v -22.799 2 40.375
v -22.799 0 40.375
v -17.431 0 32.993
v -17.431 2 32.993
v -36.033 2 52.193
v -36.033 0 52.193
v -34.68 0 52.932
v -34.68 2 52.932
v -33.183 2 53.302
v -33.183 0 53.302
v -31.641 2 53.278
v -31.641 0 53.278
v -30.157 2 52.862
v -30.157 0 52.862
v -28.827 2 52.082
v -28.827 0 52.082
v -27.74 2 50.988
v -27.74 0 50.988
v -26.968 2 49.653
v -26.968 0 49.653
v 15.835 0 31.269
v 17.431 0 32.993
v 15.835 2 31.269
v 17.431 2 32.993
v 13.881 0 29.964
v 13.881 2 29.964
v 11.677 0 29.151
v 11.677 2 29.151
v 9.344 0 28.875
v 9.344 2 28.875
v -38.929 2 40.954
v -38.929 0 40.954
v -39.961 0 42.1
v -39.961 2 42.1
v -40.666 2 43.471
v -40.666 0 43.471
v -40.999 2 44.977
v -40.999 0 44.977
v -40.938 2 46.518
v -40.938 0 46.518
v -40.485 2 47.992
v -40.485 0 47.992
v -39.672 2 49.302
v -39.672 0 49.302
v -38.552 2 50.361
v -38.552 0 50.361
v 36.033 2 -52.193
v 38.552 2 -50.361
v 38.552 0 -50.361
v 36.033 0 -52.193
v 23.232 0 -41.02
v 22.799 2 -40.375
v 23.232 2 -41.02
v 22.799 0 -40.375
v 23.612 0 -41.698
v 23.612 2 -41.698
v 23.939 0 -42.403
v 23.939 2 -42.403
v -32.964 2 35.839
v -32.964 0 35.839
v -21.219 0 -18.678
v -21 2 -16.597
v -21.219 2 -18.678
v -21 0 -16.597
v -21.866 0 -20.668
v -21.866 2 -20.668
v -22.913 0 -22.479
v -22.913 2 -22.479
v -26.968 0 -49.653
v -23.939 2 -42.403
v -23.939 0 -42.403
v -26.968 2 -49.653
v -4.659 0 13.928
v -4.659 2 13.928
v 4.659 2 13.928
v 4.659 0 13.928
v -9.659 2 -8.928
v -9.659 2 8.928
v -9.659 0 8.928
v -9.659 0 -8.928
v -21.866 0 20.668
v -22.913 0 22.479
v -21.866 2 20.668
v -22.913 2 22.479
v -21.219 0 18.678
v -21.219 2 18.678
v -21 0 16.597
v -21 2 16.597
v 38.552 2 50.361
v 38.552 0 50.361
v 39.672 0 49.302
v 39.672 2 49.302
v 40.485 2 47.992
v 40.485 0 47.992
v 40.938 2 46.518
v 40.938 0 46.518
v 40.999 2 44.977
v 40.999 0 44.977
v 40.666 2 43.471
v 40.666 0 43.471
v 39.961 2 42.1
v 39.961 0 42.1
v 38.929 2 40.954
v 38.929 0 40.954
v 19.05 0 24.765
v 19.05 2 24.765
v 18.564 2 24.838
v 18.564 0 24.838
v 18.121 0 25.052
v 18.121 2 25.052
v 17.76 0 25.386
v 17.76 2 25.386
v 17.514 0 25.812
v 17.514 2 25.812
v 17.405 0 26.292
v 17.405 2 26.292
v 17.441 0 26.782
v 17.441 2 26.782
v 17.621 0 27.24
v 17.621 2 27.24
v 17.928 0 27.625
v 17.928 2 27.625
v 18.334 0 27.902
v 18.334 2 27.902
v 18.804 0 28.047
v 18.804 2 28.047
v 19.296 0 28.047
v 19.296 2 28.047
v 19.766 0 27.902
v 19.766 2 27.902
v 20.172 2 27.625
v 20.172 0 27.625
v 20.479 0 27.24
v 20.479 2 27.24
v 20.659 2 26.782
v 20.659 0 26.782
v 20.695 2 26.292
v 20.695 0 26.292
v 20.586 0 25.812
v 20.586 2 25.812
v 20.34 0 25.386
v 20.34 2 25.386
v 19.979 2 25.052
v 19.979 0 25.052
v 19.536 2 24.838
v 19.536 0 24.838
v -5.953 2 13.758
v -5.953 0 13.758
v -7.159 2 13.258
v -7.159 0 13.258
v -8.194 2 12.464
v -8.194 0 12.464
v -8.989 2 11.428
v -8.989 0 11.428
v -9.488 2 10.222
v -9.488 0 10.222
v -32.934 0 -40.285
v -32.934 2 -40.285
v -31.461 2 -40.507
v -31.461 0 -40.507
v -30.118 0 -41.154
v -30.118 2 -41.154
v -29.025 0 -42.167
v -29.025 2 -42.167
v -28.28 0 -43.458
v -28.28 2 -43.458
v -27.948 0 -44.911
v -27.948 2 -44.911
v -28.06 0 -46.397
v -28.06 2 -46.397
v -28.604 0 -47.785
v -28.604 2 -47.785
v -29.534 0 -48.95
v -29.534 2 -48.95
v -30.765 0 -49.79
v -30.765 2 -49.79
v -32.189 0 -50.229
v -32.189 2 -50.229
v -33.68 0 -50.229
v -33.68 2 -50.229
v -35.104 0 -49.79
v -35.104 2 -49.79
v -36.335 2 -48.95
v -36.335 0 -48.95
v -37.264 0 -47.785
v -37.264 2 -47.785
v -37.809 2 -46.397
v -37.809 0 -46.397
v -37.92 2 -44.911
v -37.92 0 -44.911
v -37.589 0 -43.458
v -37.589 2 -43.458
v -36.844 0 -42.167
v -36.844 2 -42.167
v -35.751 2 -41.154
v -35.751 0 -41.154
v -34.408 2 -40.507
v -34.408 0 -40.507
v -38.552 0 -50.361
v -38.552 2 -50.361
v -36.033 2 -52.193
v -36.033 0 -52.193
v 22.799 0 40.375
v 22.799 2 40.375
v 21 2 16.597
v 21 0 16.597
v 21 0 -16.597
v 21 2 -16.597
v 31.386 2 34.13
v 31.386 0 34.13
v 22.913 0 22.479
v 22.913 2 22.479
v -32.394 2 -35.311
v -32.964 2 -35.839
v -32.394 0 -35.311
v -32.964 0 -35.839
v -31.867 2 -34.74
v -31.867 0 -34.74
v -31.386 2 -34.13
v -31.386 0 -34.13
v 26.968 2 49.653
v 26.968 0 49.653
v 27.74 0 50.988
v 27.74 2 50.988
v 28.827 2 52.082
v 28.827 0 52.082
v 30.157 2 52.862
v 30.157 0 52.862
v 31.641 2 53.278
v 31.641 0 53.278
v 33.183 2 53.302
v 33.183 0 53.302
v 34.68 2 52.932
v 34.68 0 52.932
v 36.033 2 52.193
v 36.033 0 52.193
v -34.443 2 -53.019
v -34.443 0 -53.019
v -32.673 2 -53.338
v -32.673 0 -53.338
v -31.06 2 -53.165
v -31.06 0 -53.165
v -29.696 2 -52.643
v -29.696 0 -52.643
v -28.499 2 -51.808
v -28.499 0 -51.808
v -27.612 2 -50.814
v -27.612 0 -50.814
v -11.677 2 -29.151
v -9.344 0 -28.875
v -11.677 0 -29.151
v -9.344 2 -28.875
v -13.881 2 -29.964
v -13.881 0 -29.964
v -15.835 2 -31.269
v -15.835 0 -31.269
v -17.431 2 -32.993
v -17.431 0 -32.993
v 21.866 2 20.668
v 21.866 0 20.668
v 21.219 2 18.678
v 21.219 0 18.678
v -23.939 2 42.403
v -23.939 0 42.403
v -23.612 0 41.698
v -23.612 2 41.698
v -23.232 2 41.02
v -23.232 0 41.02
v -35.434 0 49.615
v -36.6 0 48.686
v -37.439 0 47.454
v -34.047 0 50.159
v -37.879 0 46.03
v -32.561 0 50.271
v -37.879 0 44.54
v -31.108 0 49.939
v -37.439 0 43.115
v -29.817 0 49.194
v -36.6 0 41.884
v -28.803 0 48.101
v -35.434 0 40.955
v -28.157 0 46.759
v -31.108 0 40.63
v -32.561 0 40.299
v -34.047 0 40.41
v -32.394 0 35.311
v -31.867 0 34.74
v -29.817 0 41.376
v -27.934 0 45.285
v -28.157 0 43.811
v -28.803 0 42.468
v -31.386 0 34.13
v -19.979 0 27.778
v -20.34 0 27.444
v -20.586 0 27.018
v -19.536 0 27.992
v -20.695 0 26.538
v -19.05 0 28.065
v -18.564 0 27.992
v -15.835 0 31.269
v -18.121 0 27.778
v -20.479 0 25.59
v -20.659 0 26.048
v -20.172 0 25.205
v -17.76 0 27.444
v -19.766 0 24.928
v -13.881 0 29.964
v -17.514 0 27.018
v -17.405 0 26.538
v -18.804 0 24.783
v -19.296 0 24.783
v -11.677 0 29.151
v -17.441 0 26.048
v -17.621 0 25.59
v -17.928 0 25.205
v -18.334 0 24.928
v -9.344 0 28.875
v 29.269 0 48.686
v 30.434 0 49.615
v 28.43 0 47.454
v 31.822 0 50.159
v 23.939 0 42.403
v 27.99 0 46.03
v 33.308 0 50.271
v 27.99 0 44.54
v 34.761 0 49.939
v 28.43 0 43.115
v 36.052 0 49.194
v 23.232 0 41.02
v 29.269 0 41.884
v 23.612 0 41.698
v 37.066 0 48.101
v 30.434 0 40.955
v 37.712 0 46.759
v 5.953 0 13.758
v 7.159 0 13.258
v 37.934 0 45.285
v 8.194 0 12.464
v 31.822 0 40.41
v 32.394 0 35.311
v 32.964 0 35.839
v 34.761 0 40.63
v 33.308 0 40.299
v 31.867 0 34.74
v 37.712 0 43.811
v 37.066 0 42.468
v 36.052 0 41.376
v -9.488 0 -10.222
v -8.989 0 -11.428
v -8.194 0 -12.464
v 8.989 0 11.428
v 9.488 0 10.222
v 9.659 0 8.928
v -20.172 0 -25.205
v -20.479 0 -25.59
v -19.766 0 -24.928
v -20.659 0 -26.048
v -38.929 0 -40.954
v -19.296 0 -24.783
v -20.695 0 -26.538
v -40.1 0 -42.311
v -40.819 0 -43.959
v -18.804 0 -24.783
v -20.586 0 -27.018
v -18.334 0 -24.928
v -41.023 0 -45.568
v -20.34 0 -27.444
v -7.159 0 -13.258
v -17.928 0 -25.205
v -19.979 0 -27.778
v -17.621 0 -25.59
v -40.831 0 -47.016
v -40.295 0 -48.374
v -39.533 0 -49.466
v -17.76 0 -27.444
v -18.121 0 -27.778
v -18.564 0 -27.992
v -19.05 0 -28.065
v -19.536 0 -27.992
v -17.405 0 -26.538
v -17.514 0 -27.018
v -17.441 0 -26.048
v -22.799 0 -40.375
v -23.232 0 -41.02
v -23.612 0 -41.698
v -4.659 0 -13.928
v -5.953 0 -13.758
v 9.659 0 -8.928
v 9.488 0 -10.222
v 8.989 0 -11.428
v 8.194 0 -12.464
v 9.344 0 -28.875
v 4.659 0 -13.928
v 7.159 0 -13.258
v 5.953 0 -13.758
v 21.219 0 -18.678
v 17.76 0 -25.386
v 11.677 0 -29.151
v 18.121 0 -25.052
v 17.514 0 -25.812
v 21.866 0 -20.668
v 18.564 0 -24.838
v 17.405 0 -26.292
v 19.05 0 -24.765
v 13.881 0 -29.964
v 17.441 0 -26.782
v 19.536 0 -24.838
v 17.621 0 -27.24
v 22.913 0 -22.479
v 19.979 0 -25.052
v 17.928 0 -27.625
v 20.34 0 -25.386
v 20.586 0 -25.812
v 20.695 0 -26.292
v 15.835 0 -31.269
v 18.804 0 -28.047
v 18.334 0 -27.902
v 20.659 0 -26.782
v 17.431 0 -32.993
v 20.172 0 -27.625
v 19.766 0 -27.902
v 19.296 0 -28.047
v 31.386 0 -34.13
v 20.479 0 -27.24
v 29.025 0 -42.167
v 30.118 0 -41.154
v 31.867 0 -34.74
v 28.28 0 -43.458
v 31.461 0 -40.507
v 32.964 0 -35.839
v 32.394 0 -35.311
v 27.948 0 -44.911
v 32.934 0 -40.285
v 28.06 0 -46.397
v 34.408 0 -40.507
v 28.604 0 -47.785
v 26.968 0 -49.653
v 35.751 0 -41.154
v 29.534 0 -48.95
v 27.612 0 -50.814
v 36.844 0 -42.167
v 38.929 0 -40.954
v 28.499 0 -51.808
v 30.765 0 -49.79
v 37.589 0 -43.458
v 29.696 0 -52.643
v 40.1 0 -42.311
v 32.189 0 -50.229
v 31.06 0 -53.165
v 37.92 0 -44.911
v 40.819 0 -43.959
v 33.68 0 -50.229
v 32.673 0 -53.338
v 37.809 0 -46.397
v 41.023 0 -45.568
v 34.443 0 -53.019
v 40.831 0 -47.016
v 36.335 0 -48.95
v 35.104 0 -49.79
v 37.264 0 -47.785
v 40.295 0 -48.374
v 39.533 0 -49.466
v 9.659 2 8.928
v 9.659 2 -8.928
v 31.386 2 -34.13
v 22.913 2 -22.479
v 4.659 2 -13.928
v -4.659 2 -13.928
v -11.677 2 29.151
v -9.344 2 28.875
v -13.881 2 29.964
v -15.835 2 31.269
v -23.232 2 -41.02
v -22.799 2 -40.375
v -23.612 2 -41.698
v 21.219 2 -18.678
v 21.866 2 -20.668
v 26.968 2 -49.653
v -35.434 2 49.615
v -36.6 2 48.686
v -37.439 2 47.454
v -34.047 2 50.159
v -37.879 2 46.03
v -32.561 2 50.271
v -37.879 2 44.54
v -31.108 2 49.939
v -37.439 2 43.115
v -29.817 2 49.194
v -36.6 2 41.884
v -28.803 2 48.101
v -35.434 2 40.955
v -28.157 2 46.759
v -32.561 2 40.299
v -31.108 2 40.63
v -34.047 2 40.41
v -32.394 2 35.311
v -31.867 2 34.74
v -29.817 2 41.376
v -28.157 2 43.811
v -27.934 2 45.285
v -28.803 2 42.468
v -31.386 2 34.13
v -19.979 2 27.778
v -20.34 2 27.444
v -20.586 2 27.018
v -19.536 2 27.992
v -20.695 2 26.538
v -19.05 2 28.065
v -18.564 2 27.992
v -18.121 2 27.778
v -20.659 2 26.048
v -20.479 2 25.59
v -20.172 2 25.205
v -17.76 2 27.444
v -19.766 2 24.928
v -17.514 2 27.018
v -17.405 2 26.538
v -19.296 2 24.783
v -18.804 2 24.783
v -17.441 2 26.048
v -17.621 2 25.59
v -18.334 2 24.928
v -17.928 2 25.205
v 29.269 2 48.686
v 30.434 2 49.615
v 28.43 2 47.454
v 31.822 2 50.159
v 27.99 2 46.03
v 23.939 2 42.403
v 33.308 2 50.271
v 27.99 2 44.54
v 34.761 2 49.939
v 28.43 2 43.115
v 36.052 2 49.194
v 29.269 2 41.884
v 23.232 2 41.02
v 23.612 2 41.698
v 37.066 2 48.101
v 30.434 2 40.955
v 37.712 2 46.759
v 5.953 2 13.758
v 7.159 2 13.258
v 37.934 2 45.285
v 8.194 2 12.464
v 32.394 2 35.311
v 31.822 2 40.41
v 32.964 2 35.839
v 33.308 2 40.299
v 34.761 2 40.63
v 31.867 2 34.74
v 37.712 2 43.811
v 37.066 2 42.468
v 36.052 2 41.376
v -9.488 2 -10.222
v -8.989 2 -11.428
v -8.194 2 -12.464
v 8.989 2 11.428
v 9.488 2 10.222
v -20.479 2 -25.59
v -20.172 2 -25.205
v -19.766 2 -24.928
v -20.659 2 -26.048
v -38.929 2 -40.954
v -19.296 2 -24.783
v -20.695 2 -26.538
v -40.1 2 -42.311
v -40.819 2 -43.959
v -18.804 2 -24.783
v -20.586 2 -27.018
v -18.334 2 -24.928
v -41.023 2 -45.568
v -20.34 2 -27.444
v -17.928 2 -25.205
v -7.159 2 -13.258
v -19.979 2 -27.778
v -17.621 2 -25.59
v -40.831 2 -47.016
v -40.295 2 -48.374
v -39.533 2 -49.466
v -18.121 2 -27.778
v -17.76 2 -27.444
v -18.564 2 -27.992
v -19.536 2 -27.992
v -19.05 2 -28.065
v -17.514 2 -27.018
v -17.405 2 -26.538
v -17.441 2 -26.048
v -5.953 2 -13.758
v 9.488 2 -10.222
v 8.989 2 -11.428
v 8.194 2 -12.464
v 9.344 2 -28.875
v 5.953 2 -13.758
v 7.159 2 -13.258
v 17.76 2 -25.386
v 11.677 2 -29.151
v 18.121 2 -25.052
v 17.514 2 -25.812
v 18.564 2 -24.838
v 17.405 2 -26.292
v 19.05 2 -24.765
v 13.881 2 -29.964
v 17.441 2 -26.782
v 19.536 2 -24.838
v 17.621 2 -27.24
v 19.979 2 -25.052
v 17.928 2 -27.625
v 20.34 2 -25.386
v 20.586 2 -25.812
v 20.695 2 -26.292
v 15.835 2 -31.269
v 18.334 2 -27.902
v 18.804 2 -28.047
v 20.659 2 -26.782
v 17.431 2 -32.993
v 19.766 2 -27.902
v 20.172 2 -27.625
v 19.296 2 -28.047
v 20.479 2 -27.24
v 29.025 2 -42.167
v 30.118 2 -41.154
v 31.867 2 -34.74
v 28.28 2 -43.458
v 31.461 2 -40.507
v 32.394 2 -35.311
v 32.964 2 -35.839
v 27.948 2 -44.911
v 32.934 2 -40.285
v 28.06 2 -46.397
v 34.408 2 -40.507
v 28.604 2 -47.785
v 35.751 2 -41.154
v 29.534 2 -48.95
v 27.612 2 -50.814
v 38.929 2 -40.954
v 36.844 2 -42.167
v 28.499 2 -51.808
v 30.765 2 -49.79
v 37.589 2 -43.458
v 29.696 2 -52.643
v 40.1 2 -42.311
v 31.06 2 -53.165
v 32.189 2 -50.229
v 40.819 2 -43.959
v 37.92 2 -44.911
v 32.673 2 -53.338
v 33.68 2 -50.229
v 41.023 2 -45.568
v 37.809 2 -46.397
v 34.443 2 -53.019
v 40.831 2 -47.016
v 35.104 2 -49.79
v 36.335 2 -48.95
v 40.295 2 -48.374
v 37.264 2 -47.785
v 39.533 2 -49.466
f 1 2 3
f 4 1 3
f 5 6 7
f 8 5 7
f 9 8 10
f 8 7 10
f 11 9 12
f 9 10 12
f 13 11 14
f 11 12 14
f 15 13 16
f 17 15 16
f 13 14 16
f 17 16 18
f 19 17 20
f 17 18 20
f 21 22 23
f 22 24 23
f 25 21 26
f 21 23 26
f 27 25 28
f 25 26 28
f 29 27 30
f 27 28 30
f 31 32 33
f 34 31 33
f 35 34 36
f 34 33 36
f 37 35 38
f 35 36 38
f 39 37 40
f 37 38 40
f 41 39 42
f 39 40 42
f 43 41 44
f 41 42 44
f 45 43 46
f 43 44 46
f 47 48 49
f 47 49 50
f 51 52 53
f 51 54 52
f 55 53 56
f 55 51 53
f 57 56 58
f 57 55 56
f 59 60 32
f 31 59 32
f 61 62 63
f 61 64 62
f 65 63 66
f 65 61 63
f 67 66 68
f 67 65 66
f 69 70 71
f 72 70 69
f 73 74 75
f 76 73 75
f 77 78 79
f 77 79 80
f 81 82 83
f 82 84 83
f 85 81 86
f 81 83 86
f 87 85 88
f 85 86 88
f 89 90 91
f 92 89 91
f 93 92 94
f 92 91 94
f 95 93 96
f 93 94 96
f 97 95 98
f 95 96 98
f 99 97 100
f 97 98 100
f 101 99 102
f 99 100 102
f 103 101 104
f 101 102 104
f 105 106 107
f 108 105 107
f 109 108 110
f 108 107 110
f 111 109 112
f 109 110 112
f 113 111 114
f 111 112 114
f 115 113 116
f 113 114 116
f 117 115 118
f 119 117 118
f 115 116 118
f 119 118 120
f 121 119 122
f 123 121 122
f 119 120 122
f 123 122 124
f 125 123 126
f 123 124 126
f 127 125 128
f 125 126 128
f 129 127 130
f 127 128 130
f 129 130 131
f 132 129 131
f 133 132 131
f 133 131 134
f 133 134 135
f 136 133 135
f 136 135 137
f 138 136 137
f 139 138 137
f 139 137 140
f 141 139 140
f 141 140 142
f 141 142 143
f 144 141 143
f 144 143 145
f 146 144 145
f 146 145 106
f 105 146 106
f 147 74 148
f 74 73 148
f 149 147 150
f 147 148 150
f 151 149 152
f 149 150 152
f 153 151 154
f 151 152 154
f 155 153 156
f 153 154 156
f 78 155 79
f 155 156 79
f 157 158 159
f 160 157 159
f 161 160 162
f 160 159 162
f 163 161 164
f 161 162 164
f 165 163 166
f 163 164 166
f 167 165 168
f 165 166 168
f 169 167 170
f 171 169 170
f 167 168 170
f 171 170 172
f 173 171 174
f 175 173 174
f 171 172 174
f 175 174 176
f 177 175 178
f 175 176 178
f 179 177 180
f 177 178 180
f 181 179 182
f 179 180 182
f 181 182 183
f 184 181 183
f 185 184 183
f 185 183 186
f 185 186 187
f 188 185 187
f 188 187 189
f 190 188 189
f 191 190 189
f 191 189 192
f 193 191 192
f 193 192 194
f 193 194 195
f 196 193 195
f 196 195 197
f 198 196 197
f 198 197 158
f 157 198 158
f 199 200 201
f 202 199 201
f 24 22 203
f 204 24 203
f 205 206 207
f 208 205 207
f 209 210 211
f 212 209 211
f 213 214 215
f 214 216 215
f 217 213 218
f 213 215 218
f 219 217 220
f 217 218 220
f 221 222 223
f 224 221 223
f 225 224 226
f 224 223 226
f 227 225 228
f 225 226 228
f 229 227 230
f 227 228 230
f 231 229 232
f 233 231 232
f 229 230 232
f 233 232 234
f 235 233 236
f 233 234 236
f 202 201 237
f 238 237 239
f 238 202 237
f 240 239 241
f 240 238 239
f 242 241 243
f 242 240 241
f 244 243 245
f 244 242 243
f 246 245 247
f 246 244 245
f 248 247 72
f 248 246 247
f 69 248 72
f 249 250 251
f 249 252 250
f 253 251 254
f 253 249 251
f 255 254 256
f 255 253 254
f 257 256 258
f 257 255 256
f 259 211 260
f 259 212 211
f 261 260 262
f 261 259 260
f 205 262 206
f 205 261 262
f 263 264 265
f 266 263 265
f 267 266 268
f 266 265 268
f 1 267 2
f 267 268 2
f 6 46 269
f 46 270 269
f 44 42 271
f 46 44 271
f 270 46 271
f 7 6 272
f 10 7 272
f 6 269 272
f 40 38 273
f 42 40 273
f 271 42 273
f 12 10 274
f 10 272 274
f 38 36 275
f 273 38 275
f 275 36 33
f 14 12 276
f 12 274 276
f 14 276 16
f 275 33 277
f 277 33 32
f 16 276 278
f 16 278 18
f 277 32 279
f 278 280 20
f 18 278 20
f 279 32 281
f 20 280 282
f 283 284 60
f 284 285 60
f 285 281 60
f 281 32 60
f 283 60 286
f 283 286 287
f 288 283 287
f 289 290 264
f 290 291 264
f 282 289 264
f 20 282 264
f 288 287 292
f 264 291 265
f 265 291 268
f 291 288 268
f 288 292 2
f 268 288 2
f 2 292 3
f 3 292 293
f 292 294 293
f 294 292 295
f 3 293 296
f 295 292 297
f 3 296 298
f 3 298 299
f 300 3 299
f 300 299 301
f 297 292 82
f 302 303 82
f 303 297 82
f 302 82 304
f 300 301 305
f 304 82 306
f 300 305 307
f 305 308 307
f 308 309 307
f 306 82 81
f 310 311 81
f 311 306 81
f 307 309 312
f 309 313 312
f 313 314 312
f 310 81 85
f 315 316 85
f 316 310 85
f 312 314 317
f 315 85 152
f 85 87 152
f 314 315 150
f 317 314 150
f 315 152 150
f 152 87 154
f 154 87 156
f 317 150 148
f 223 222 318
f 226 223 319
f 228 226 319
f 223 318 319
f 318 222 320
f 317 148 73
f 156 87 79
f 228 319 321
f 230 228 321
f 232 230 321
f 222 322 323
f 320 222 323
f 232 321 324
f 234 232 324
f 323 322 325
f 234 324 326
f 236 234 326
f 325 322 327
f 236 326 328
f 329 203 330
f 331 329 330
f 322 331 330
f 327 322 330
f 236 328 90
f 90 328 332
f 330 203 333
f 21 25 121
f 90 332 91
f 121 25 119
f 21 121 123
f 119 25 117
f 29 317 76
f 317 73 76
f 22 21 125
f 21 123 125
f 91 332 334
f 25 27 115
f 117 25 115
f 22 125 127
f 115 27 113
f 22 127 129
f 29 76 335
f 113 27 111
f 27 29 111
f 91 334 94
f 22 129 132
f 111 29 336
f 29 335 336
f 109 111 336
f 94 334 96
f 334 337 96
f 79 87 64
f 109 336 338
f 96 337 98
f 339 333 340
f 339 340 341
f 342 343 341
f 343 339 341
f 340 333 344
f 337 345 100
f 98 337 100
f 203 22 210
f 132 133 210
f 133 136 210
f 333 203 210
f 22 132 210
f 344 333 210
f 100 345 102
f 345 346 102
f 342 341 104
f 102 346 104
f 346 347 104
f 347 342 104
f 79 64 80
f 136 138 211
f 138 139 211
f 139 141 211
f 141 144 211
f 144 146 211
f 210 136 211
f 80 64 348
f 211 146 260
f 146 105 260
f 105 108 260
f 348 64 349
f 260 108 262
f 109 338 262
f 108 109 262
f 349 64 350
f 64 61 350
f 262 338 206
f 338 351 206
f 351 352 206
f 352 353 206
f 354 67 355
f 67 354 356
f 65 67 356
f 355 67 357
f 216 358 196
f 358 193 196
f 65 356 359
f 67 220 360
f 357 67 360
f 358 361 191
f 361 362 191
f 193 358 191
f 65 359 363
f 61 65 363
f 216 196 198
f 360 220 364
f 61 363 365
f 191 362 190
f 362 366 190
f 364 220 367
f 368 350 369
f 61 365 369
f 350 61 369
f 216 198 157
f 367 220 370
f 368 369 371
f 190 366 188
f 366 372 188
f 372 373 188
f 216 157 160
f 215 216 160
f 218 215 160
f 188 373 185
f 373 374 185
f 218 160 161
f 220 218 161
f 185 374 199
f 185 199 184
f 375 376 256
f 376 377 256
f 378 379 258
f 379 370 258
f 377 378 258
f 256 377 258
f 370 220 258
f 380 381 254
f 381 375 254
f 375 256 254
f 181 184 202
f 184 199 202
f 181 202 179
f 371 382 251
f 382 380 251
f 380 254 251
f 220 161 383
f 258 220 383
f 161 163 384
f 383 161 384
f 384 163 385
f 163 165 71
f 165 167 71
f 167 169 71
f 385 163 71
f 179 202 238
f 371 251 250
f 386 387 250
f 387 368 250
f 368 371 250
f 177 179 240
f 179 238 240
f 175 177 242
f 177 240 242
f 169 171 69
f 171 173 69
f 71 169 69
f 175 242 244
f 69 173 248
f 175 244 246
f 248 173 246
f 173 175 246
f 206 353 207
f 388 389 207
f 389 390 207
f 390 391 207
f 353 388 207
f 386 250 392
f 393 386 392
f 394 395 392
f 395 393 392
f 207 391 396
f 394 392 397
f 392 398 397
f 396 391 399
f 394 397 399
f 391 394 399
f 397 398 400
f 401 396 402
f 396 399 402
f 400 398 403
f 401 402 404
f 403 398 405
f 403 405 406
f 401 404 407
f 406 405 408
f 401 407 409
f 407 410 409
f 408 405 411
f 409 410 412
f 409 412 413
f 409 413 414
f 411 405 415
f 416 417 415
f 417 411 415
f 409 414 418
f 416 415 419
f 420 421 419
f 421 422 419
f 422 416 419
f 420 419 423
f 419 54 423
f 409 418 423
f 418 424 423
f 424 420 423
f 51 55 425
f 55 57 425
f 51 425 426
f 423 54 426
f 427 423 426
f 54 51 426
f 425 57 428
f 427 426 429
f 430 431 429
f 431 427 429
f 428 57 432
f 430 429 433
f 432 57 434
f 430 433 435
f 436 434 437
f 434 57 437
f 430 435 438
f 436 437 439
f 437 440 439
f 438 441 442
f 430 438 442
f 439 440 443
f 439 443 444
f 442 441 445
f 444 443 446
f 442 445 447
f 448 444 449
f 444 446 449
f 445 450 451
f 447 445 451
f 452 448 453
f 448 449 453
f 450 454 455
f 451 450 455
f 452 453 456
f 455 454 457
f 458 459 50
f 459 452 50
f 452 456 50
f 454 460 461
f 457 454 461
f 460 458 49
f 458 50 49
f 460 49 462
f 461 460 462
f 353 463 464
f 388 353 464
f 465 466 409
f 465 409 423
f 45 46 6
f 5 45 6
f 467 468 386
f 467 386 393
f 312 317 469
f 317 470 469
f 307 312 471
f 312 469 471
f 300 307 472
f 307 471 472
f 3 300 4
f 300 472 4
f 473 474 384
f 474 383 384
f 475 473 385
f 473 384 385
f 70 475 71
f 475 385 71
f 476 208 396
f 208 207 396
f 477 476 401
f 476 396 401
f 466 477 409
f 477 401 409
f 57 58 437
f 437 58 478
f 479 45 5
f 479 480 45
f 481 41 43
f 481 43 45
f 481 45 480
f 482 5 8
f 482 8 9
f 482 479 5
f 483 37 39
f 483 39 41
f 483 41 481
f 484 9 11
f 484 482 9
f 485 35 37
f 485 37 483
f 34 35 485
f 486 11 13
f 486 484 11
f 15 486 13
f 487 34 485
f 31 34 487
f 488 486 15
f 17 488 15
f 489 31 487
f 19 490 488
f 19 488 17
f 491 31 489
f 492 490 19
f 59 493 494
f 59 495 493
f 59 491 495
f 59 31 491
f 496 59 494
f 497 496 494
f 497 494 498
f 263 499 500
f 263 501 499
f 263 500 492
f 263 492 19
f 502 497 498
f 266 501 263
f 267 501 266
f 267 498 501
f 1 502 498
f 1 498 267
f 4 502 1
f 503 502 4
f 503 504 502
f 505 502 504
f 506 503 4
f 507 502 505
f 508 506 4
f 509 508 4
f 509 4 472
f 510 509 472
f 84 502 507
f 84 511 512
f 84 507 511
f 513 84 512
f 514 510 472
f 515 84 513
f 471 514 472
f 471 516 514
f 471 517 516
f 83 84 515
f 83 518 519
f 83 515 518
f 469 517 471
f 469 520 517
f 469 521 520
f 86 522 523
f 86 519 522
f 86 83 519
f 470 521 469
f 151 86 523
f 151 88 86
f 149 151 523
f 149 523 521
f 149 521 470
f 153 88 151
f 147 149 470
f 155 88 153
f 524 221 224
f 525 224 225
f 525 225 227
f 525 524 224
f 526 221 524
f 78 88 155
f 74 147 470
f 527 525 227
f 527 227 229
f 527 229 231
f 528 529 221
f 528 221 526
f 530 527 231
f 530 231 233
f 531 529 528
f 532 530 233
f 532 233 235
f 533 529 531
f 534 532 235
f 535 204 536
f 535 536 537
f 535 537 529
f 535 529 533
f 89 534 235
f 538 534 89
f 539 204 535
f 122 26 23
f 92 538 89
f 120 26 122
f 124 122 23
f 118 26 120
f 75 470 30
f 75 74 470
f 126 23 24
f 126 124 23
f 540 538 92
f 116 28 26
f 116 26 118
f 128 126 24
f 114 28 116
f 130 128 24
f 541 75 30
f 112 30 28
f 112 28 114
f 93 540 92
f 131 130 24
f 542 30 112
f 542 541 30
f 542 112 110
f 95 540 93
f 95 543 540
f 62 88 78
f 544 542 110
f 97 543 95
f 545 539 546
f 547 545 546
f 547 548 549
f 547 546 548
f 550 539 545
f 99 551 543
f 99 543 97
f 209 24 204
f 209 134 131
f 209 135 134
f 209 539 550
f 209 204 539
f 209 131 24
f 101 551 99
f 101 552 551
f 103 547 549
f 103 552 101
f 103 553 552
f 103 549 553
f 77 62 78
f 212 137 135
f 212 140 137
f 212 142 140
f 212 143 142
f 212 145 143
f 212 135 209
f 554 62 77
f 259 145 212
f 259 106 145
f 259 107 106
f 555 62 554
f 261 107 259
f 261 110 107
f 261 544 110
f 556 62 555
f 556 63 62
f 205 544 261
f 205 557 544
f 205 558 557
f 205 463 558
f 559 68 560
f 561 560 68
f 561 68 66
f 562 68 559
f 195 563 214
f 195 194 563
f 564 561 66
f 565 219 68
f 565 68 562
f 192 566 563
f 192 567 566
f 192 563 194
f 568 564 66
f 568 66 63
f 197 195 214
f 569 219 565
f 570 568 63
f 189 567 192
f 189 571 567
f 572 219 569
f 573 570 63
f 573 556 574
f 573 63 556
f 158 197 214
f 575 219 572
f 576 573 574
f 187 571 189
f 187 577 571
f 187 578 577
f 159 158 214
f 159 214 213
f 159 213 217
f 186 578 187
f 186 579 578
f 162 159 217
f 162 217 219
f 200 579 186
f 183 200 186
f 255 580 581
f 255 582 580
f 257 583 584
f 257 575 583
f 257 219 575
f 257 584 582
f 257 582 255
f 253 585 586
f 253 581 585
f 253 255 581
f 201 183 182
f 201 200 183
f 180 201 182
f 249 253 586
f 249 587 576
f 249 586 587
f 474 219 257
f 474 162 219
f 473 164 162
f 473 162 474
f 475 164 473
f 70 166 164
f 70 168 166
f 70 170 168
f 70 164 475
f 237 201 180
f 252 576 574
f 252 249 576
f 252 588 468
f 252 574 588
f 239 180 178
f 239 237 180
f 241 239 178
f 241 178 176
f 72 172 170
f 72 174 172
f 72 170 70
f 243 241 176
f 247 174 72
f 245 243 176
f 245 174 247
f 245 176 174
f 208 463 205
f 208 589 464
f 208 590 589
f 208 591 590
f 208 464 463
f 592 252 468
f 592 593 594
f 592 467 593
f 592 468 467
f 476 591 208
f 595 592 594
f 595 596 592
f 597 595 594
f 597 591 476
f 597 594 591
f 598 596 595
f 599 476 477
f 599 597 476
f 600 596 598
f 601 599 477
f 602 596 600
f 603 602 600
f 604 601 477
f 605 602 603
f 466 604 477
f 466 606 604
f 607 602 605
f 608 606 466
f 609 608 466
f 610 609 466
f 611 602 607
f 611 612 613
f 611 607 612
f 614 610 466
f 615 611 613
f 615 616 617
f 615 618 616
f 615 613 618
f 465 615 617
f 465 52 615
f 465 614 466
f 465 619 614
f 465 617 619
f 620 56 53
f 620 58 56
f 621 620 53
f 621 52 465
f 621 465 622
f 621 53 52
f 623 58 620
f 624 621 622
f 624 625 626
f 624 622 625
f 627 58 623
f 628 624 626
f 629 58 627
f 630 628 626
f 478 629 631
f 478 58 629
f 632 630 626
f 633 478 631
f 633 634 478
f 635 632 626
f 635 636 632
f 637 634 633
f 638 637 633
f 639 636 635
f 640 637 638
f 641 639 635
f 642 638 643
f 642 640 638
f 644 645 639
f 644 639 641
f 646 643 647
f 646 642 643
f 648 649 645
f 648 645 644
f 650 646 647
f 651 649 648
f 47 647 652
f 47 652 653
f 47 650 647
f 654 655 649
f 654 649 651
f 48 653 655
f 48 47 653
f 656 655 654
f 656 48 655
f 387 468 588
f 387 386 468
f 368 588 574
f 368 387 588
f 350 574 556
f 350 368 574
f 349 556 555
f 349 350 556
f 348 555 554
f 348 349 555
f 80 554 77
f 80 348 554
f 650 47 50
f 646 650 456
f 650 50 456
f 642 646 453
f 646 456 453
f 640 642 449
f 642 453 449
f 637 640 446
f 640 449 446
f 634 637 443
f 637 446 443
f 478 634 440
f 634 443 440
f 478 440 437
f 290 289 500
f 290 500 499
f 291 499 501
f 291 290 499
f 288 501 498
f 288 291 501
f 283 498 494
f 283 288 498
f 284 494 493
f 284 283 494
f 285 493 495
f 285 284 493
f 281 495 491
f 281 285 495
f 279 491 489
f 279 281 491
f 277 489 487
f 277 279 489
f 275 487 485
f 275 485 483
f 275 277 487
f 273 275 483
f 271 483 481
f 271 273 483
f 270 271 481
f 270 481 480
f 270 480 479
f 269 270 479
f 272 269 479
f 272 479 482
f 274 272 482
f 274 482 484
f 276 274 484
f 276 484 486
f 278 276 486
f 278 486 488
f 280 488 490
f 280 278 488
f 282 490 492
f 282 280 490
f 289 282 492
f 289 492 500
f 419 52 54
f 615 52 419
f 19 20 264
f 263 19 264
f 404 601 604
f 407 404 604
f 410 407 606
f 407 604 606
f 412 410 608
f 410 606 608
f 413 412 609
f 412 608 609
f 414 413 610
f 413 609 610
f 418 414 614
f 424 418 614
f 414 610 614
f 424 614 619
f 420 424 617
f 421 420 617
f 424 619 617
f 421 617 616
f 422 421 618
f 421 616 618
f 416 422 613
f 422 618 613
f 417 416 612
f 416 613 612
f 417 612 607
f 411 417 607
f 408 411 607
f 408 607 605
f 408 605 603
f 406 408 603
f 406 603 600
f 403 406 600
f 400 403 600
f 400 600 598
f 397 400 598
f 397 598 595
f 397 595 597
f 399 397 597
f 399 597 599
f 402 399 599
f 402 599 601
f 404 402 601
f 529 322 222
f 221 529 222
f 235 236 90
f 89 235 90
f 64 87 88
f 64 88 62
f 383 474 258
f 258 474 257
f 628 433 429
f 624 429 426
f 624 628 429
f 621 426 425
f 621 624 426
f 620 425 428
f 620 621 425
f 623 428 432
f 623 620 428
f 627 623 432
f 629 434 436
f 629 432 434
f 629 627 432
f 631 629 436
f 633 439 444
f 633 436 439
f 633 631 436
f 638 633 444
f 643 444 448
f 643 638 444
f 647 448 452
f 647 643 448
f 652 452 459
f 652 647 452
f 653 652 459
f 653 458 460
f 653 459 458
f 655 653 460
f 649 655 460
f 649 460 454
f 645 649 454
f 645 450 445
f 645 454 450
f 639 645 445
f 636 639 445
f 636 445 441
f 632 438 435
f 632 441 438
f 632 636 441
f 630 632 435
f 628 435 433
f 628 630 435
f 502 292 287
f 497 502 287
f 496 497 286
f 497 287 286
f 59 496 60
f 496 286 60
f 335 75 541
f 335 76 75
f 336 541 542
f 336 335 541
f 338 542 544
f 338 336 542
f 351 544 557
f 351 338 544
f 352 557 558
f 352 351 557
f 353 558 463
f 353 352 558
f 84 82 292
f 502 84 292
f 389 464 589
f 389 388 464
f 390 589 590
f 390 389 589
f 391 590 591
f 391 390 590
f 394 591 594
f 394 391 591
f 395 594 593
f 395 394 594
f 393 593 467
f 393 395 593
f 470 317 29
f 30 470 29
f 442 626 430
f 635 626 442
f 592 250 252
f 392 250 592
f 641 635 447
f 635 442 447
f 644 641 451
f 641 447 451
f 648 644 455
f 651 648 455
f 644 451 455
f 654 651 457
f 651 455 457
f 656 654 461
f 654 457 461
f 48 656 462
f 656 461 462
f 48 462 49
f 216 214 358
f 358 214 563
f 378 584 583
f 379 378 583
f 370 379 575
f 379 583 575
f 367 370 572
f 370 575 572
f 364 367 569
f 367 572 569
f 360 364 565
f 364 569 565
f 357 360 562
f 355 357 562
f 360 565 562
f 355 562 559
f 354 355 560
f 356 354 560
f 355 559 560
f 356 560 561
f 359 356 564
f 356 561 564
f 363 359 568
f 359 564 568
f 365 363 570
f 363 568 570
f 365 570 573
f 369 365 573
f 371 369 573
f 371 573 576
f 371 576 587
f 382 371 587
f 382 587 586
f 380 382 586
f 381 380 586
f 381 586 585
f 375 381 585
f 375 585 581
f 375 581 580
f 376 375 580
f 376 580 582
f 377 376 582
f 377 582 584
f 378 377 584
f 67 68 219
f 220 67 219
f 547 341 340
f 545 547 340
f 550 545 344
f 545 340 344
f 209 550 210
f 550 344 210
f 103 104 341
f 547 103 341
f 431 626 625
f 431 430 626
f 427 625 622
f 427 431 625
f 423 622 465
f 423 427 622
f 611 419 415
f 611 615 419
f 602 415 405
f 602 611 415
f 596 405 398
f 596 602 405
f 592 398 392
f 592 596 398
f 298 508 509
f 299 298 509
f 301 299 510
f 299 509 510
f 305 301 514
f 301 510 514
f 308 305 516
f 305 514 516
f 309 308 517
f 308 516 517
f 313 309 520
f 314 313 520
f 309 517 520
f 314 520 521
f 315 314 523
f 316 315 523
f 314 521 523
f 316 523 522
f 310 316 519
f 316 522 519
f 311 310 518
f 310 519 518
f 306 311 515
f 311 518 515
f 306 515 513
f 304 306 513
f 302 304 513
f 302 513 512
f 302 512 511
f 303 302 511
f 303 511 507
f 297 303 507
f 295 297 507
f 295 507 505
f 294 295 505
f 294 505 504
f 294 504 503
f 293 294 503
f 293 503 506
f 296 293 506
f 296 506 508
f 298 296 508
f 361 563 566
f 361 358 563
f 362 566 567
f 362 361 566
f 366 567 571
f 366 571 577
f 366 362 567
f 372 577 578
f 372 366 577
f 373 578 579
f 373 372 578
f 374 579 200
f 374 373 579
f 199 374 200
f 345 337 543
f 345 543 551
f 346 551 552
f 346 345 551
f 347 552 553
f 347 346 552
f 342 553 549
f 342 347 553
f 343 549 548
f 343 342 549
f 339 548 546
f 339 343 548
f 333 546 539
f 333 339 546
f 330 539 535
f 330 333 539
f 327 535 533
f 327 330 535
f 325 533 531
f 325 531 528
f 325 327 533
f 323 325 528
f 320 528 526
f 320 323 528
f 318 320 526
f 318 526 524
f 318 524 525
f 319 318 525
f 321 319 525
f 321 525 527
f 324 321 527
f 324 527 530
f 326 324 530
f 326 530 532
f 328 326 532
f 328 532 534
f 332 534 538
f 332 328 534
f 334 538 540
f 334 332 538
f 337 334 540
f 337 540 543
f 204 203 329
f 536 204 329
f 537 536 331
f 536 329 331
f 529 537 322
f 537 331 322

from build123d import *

# Parameters (mm, degrees)
SKETCH_1_W             = 42
SKETCH_1_H             = 57.75
EXTRUDE_1_DEPTH        = 2
EXTRUDE_2_DEPTH        = 2
SKETCH_8_W             = 19.31744652
SKETCH_8_H             = 27.856514232
CUT_EXTRUDE_4_DEPTH    = 9
FILLET_4_R             = 5
SKETCH_5_R             = 5
CUT_EXTRUDE_6_DEPTH    = 10
EXTRUDE_3_DEPTH        = 2
FILLET_5_R             = 10
FILLET_6_R             = 6
FILLET_5_OF_MIRROR_1_R = 10
FILLET_6_OF_MIRROR_1_R = 6
MIRROR_2_OUTLINE_R     = 5
MIRROR_2_DEPTH         = 2
SKETCH_3_R             = 1.65
CUT_EXTRUDE_1_DEPTH    = 68.321095486
FILLET_7_R             = 10


# Read off the part's stored shape, not the designer's step: 镜向2
with BuildPart() as part:
    # 草图1 → 凸台-拉伸1 (new body)
    with BuildSketch(Plane(origin=(0, 0, 0), x_dir=(1, 0, 0), z_dir=(0, 1, 0))):
        Rectangle(SKETCH_1_W, SKETCH_1_H)
    extrude(amount=EXTRUDE_1_DEPTH)

    # 草图2 → 凸台-拉伸2 (add)
    with BuildSketch(Plane(origin=(0, 2, 0), x_dir=(1, 0, 0), z_dir=(0, 1, 0))):
        Polygon((-12.413267133, 26.094069469), (-21, 19.849172839), (-41.586009419, 48.154935789), (-32.999276552, 54.39983242), align=None)
    extrude_2 = extrude(amount=-EXTRUDE_2_DEPTH)

    # 草图8 → 切除-拉伸4 (cut)
    with BuildSketch(Plane(origin=(0, 2, 0), x_dir=(1, 0, 0), z_dir=(0, 1, 0))):
        Rectangle(SKETCH_8_W, SKETCH_8_H)
    extrude(amount=-CUT_EXTRUDE_4_DEPTH, mode=Mode.SUBTRACT)

    # 圆角4
    fillet_4_edges = [part.edges().sort_by_distance(p)[0] for p in [
        (-9.65872326, 1, 13.928257116),
        (-9.65872326, 1, -13.928257116),
        (9.65872326, 1, -13.928257116),
        (9.65872326, 1, 13.928257116),
    ]]
    fillet(fillet_4_edges, radius=FILLET_4_R)

    # 草图5 → 切除-拉伸6 (cut)
    with BuildSketch(Plane(origin=(0, 2, 0), x_dir=(1, 0, 0), z_dir=(0, 1, 0))):
        with Locations(Location((-32.934365155, 45.284752088, 0), (0, 0, 270))):
            Circle(SKETCH_5_R)
    cut_extrude_6 = extrude(amount=-CUT_EXTRUDE_6_DEPTH, mode=Mode.SUBTRACT)

    # 草图9 → 凸台-拉伸3 (add)
    with BuildSketch(Plane(origin=(0, 2, 0), x_dir=(1, 0, 0), z_dir=(0, 1, 0))):
        Polygon((-32.07479568, 35.077016899), (-44.691673686, 45.896270868), (-41.586009419, 48.154935789), align=None)
        Polygon((-23.488062813, 41.321913529), (-29.893612284, 56.658497342), (-32.999276552, 54.39983242), align=None)
    extrude_3 = extrude(amount=-EXTRUDE_3_DEPTH)

    # 圆角5
    fillet_5_edges = [part.edges().sort_by_distance(p)[0] for p in [
        (-32.07479568, 1, -35.077016899),
        (-23.488062813, 1, -41.321913529),
    ]]
    fillet(fillet_5_edges, radius=FILLET_5_R)

    # 圆角6
    fillet_6_edges = [part.edges().sort_by_distance(p)[0] for p in [
        (-44.691673686, 1, -45.896270868),
        (-29.893612284, 1, -56.658497342),
    ]]
    fillet(fillet_6_edges, radius=FILLET_6_R)

    # 镜向1: 凸台-拉伸2, 切除-拉伸6, 凸台-拉伸3 across plane
    add(extrude_2.mirror(Plane(origin=(0, 0, 0), x_dir=(0, 0, 1), z_dir=(1, 0, 0))))
    add(cut_extrude_6.mirror(Plane(origin=(0, 0, 0), x_dir=(0, 0, 1), z_dir=(1, 0, 0))), mode=Mode.SUBTRACT)
    add(extrude_3.mirror(Plane(origin=(0, 0, 0), x_dir=(0, 0, 1), z_dir=(1, 0, 0))))

    # 圆角5 of 镜向1
    fillet_5_of_mirror_1_edges = [part.edges().sort_by_distance(p)[0] for p in [
        (32.07479568, 1, -35.077016899),
        (23.488062813, 1, -41.321913529),
    ]]
    fillet(fillet_5_of_mirror_1_edges, radius=FILLET_5_OF_MIRROR_1_R)

    # 圆角6 of 镜向1
    fillet_6_of_mirror_1_edges = [part.edges().sort_by_distance(p)[0] for p in [
        (44.691673686, 1, -45.896270868),
        (29.893612284, 1, -56.658497342),
    ]]
    fillet(fillet_6_of_mirror_1_edges, radius=FILLET_6_OF_MIRROR_1_R)

    # 镜向2 outline → 镜向2 (add)
    # profile 1 of 2: a face of its own
    with BuildSketch(Plane(origin=(0, 0, 0), x_dir=(1, 0, 0), z_dir=(0, 1, 0))):
        with BuildLine():
            Line((21, -28.875), (14.435762065, -28.875))
            Line((14.435762065, -28.875), (22.799263539, -40.374814527))
            ThreePointArc((22.799263539, -40.374814527), (23.428494894, -41.355407098), (23.939399044, -42.402532133))
            Line((23.939399044, -42.402532133), (26.967769787, -49.653254641))
            ThreePointArc((26.967769787, -49.653254641), (30.885501706, -53.118362872), (36.033297782, -52.193271525))
            Line((36.033297782, -52.193271525), (38.551988188, -50.361496684))
            ThreePointArc((38.551988188, -50.361496684), (41.018152801, -45.749162076), (38.928702373, -40.954394579))
            Line((38.928702373, -40.954394579), (32.963783297, -35.839343585))
            ThreePointArc((32.963783297, -35.839343585), (32.12501319, -35.030666519), (31.385996405, -34.129917896))
            Line((31.385996405, -34.129917896), (21, -19.849172839))
            Line((21, -19.849172839), (21, -28.875))
        make_face()
        with Locations((32.934365155, -45.284752088)):
            Circle(MIRROR_2_OUTLINE_R, mode=Mode.SUBTRACT)
    # profile 2 of 2: a face of its own
    with BuildSketch(Plane(origin=(0, 0, 0), x_dir=(1, 0, 0), z_dir=(0, 1, 0))):
        with BuildLine():
            Line((-22.799263539, -40.374814527), (-14.435762065, -28.875))
            Line((-14.435762065, -28.875), (-21, -28.875))
            Line((-21, -28.875), (-21, -19.849172839))
            Line((-21, -19.849172839), (-31.385996405, -34.129917896))
            ThreePointArc((-31.385996405, -34.129917896), (-32.12501319, -35.030666519), (-32.963783297, -35.839343585))
            Line((-32.963783297, -35.839343585), (-38.928702373, -40.954394579))
            ThreePointArc((-38.928702373, -40.954394579), (-41.018152801, -45.749162076), (-38.551988188, -50.361496684))
            Line((-38.551988188, -50.361496684), (-36.033297782, -52.193271525))
            ThreePointArc((-36.033297782, -52.193271525), (-30.885501706, -53.118362872), (-26.967769787, -49.653254641))
            Line((-26.967769787, -49.653254641), (-23.939399044, -42.402532133))
            ThreePointArc((-23.939399044, -42.402532133), (-23.428494894, -41.355407098), (-22.799263539, -40.374814527))
        make_face()
        with Locations((-32.934365155, -45.284752088)):
            Circle(MIRROR_2_OUTLINE_R, mode=Mode.SUBTRACT)
    extrude(amount=MIRROR_2_DEPTH)

    # 草图3 → 切除-拉伸1 (cut, through all)
    with BuildSketch(Plane(origin=(0, 2, 0), x_dir=(1, 0, 0), z_dir=(0, 1, 0))):
        with Locations(Location((19.05, 26.415, 0), (0, 0, 270))):
            Circle(SKETCH_3_R)
        with Locations(Location((19.05, -26.415, 0), (0, 0, 90))):
            Circle(SKETCH_3_R)
        with Locations(Location((-19.05, -26.415, 0), (0, 0, 270))):
            Circle(SKETCH_3_R)
        with Locations(Location((-19.05, 26.415, 0), (0, 0, 90))):
            Circle(SKETCH_3_R)
    extrude(amount=-CUT_EXTRUDE_1_DEPTH, mode=Mode.SUBTRACT)

    # 圆角7
    fillet_7_edges = [part.edges().sort_by_distance(p)[0] for p in [
        (14.435762065, 1, -28.875),
        (21, 1, -19.849172839),
        (-21, 1, -19.849172839),
        (-14.435762065, 1, -28.875),
        (21, 1, 19.849172839),
        (14.435762065, 1, 28.875),
        (-14.435762065, 1, 28.875),
        (-21, 1, 19.849172839),
    ]]
    fillet(fillet_7_edges, radius=FILLET_7_R)


solid = part.part
